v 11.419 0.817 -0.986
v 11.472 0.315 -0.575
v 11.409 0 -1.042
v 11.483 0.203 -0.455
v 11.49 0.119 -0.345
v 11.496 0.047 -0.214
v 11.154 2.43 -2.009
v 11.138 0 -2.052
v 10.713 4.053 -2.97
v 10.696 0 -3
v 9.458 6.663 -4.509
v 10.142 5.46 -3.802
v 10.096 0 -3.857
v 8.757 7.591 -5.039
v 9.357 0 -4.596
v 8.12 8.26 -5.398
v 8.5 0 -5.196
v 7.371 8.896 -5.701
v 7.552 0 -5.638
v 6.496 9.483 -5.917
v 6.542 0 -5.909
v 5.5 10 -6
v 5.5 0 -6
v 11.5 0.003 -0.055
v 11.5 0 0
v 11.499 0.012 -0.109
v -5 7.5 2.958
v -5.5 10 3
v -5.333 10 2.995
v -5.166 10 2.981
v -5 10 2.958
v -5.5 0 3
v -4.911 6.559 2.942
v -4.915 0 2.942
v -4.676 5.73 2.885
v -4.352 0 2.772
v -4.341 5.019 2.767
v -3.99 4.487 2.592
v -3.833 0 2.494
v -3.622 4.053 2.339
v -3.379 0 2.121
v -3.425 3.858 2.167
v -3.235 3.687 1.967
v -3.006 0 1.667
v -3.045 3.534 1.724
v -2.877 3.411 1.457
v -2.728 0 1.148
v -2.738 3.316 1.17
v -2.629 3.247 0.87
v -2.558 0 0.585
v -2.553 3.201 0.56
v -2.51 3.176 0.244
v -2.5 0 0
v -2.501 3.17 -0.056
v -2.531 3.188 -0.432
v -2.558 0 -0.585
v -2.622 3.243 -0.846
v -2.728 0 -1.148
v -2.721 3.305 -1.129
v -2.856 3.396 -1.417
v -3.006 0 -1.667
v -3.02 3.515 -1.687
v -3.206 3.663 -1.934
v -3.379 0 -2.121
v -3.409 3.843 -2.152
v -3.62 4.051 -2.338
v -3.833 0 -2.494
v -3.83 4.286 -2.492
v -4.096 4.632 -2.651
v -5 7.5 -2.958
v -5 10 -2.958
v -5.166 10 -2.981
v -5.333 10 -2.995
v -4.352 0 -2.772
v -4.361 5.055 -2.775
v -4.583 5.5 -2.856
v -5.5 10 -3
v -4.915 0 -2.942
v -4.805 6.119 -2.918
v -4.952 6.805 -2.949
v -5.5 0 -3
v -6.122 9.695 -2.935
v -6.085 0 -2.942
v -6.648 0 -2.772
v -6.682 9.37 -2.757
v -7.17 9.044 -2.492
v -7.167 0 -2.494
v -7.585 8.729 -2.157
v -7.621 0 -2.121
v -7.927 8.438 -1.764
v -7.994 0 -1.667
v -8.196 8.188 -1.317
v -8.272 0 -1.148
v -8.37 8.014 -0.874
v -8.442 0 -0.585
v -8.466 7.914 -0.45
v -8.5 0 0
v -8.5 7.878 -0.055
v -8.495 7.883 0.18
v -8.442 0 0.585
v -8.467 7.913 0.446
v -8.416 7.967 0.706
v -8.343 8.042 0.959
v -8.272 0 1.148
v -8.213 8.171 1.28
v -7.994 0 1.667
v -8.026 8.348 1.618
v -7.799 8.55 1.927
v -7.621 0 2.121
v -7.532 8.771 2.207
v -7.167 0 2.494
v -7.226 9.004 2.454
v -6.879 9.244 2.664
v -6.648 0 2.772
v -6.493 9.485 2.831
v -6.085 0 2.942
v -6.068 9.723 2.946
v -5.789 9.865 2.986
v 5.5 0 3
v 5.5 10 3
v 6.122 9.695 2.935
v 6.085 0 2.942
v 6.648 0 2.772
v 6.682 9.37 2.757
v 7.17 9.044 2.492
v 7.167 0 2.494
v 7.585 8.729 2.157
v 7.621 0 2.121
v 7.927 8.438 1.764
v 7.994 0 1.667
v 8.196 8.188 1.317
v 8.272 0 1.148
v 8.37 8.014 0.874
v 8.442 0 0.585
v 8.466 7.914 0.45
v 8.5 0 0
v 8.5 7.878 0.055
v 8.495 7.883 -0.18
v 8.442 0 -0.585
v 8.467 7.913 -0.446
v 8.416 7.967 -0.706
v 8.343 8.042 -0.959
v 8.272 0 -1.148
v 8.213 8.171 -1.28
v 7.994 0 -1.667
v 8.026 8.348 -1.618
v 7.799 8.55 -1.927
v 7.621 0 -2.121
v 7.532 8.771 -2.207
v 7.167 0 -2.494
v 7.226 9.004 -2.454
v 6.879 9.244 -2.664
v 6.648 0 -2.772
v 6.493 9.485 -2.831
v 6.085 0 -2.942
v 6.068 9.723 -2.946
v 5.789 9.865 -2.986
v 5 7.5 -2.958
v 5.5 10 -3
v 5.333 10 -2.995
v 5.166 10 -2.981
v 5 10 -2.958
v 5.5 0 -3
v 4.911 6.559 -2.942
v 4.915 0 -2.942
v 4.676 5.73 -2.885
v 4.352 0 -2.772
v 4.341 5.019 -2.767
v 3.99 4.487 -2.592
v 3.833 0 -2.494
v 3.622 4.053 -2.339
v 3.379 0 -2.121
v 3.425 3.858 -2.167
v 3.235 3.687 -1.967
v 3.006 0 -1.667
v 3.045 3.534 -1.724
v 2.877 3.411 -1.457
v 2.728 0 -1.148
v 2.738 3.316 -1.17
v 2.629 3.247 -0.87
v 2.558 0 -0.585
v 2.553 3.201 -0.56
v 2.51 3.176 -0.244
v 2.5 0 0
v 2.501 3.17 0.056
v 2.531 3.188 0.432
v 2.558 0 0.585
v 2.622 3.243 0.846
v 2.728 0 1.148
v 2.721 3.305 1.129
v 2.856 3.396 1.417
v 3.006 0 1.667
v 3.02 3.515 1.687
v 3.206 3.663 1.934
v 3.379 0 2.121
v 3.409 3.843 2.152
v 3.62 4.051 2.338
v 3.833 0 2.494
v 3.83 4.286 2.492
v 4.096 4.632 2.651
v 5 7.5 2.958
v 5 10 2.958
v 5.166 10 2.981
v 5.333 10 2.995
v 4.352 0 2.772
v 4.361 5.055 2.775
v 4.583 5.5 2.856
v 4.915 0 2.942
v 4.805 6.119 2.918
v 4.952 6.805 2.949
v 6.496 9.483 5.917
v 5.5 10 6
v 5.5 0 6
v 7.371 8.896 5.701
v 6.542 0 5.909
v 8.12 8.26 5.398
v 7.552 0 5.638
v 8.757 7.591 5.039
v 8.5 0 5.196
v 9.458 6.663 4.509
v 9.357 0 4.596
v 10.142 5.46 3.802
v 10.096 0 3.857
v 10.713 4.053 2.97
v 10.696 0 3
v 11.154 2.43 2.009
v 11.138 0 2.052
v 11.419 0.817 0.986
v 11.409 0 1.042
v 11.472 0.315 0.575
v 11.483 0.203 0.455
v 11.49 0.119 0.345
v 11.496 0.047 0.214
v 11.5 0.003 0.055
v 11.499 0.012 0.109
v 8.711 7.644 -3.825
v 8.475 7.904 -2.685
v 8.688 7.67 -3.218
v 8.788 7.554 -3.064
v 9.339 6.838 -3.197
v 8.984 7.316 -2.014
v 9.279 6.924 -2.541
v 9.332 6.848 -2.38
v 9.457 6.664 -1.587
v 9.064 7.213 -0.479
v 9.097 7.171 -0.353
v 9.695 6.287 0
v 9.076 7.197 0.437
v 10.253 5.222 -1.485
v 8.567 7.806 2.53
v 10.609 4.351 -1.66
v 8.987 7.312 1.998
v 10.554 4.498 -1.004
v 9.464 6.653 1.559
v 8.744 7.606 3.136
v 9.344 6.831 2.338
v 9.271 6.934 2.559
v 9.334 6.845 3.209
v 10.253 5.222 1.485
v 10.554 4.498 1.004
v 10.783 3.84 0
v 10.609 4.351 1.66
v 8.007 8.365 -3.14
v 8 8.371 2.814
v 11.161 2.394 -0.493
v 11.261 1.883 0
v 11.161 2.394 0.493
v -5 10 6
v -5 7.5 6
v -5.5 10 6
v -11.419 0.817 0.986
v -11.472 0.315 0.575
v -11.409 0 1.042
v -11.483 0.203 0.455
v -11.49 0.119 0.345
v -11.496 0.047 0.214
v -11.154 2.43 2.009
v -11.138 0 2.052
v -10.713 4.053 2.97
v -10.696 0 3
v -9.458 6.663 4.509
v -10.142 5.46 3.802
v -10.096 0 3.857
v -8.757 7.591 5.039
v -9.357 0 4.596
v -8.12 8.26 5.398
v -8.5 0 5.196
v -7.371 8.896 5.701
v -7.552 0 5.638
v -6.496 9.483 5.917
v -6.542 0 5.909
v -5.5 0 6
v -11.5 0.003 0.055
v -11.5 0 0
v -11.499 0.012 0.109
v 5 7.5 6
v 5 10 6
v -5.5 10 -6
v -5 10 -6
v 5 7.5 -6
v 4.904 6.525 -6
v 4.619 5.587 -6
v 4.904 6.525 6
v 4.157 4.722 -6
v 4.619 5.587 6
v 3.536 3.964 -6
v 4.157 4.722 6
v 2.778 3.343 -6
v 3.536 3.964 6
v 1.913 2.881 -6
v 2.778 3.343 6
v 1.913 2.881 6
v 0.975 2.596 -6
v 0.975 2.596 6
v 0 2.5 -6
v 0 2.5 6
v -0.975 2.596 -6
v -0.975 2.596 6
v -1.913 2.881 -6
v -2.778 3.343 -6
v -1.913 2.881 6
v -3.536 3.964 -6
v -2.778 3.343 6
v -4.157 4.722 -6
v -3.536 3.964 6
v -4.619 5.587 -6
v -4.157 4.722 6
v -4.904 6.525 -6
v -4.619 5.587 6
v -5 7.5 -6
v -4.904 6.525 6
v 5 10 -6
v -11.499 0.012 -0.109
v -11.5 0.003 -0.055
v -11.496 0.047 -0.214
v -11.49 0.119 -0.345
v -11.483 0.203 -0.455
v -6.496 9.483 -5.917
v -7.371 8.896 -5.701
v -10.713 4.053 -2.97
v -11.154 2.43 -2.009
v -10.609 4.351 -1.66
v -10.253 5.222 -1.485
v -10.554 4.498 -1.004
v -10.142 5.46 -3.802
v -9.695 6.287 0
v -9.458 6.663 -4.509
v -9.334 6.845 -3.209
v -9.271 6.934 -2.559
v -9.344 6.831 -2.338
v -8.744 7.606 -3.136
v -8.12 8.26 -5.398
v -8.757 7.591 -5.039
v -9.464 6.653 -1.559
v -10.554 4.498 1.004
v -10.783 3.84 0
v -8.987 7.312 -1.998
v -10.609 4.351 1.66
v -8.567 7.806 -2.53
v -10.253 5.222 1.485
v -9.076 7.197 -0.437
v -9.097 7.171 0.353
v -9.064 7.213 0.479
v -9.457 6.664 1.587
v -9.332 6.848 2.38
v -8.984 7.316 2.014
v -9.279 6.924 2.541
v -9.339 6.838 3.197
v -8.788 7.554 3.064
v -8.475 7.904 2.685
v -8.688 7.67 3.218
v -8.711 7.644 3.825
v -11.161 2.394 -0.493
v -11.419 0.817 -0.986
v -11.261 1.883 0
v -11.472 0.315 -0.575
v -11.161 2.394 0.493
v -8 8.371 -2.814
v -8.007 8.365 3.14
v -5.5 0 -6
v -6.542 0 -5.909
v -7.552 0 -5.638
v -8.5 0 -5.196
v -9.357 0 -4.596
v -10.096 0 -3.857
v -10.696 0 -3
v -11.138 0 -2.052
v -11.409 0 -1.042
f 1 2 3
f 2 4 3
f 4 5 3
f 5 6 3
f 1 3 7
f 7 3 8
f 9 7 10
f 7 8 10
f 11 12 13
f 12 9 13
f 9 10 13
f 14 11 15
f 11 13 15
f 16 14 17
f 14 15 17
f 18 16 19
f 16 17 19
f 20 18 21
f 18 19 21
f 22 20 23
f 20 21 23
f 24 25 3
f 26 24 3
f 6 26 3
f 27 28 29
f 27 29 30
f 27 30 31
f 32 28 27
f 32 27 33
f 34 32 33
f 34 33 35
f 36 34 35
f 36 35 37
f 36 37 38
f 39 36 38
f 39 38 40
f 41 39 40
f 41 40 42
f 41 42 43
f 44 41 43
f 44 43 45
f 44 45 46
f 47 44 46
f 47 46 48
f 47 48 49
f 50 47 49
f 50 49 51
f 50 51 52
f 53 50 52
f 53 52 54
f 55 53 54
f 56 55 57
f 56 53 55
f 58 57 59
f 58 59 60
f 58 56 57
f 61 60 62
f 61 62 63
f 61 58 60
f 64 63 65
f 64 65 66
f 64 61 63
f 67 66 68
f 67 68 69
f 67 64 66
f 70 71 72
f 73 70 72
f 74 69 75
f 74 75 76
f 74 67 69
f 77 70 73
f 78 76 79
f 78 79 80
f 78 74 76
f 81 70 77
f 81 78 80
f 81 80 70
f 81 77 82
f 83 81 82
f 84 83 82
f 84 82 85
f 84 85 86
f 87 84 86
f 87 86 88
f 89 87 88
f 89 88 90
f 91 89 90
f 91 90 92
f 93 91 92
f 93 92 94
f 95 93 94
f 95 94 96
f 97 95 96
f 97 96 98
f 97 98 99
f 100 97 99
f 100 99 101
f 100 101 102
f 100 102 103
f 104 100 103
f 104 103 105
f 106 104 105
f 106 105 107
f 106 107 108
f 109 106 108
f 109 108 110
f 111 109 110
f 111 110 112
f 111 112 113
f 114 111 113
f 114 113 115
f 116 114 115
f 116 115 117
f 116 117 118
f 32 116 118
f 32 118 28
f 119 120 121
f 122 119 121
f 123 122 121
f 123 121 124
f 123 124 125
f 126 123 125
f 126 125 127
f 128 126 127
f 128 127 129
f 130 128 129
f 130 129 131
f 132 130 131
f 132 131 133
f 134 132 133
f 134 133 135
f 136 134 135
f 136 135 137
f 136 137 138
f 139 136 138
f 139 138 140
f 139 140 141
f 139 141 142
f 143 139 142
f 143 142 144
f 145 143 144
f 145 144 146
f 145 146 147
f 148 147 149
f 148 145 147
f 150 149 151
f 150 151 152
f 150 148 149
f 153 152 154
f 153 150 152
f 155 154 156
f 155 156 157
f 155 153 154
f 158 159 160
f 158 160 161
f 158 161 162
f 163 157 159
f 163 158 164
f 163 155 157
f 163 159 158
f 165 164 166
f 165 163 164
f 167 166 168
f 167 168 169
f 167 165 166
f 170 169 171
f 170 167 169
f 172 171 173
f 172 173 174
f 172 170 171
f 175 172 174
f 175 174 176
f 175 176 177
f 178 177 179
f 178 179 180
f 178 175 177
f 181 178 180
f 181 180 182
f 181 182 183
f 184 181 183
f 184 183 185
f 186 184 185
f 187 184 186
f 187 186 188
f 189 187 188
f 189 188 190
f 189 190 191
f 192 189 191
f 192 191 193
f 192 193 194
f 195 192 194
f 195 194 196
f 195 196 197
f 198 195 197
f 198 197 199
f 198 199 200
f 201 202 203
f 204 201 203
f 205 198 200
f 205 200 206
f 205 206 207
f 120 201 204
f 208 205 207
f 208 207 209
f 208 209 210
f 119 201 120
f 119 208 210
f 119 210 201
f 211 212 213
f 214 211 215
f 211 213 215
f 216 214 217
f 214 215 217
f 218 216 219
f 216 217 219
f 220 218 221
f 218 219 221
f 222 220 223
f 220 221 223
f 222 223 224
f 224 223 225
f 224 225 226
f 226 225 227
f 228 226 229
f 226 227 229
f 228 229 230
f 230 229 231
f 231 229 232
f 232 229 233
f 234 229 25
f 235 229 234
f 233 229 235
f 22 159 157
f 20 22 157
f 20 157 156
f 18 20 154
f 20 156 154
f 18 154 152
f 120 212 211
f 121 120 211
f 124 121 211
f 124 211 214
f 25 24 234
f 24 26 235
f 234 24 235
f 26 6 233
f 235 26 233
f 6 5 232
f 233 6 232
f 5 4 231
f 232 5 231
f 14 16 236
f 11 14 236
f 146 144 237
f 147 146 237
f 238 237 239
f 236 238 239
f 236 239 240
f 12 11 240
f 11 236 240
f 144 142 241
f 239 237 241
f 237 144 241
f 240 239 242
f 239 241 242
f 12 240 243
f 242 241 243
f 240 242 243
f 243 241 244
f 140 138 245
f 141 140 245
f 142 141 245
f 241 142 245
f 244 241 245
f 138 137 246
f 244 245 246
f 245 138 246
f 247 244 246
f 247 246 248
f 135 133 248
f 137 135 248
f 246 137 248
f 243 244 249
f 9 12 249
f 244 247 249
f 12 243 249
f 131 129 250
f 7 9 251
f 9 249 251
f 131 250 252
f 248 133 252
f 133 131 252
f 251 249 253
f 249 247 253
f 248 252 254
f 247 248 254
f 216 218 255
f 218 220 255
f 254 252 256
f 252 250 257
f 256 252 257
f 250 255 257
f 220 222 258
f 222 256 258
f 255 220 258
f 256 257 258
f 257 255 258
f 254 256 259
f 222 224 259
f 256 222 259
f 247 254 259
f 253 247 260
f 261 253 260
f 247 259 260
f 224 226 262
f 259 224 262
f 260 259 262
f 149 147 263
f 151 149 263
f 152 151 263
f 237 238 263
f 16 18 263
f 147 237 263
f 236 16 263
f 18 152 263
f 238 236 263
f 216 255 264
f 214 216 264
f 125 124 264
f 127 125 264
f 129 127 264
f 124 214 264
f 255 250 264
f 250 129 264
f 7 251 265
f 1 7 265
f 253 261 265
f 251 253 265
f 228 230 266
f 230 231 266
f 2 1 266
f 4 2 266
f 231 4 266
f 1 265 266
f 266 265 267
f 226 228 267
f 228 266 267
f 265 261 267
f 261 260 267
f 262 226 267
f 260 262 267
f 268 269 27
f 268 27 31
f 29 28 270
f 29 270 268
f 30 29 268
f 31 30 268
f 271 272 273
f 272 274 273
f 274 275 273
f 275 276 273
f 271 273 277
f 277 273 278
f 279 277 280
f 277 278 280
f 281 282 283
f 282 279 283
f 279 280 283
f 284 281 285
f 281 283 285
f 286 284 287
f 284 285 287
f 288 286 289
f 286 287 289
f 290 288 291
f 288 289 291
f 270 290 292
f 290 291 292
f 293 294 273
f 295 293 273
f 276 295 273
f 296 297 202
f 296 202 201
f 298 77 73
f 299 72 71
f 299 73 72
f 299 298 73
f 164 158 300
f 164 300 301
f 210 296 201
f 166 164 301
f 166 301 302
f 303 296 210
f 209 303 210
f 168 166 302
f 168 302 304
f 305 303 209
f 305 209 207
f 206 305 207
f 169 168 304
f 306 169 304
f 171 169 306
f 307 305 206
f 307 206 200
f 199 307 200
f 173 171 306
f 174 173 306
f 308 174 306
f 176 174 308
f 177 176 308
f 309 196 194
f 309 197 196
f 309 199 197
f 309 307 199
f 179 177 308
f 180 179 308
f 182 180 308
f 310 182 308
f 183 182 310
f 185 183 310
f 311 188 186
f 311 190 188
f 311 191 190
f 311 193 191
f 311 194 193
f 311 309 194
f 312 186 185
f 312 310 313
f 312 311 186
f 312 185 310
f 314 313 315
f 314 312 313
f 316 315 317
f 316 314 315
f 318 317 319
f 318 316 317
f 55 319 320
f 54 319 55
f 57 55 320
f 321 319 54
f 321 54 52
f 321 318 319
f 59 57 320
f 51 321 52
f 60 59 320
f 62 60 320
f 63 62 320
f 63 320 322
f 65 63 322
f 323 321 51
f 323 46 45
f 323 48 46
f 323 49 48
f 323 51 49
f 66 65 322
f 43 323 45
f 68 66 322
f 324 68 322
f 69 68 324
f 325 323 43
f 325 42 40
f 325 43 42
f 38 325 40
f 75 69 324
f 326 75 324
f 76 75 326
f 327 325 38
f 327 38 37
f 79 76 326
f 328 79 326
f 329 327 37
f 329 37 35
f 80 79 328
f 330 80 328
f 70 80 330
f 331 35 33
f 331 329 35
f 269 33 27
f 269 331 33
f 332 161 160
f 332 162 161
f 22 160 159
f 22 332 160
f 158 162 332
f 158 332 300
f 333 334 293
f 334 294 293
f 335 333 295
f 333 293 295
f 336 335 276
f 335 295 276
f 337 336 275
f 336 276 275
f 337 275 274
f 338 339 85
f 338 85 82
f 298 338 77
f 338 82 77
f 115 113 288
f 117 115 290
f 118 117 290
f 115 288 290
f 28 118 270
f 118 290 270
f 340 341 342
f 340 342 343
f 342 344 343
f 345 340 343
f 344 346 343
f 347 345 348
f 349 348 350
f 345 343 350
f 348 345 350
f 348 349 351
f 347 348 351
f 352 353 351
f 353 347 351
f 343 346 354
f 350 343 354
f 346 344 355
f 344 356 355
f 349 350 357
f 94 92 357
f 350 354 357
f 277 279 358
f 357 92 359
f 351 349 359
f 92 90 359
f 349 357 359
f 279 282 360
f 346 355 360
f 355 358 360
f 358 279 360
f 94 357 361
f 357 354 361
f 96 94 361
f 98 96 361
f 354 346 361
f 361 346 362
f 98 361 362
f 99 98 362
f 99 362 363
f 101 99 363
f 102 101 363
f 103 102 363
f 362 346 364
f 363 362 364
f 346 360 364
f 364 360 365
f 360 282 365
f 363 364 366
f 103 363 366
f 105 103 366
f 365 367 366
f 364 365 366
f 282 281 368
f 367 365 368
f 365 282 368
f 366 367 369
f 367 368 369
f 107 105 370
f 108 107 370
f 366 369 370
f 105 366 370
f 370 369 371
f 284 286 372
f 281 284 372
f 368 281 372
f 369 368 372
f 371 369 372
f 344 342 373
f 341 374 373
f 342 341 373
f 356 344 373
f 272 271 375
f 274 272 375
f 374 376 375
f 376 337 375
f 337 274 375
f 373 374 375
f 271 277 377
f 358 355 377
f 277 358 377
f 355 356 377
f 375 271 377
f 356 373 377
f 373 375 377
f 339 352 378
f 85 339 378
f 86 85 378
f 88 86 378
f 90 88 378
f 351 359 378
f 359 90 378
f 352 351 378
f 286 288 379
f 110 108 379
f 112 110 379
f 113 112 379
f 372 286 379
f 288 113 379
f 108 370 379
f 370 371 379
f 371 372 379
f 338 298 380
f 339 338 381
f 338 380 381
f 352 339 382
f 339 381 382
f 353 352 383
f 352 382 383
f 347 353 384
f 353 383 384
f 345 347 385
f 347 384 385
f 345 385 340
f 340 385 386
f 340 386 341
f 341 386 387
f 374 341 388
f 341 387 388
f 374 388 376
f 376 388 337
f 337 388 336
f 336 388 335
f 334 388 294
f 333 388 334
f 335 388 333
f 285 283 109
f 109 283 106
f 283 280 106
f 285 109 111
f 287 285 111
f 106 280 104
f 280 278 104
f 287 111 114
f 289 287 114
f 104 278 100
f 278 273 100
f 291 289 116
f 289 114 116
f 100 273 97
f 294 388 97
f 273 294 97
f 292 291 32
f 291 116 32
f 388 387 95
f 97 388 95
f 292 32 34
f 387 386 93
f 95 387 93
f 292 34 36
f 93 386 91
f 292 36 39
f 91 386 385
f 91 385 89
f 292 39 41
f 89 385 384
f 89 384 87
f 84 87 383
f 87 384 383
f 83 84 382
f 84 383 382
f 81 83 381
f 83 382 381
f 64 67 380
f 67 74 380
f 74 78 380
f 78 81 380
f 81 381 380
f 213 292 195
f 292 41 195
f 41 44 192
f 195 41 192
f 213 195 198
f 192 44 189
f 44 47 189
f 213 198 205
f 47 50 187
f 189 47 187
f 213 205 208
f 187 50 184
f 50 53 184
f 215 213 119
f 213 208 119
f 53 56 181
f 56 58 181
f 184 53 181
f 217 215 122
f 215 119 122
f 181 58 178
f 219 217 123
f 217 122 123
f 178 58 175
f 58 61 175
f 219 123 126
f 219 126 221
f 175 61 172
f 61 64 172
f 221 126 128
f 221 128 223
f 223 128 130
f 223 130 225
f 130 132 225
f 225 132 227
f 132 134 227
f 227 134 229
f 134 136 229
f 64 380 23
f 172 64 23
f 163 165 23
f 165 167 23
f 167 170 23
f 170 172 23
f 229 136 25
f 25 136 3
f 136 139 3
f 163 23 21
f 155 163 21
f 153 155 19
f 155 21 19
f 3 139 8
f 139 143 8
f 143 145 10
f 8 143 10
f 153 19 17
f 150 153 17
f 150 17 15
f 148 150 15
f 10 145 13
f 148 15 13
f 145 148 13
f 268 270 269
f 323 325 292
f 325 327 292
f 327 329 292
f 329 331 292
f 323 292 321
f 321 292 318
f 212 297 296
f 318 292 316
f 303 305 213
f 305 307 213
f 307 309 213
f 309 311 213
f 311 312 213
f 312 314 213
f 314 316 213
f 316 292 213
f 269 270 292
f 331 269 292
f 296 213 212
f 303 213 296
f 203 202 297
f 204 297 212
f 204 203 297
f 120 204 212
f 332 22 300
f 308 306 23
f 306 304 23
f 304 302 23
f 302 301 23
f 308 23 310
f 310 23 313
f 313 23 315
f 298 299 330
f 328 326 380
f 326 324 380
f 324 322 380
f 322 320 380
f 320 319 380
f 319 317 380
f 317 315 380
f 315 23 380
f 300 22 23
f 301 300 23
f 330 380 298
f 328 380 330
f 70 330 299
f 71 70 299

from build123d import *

# Parameters (mm, degrees)
ESBO_O1_R                = 3
RESSALTO_EXTRUS_O1_DEPTH = 10
CORTE_EXTRUS_O1_DEPTH    = 20.397164741
CORTE_EXTRUS_O2_DEPTH    = 20.397164855


with BuildPart() as part:
    # Esboço1 → Ressalto-extrusão1 (new body)
    with BuildSketch(Plane(origin=(0, 0, 0), x_dir=(1, 0, 0), z_dir=(0, 1, 0))):
        with BuildLine():
            Line((-5.5, -6), (5.5, -6))
            ThreePointArc((5.5, -6), (11.5, 0), (5.5, 6))
            Line((5.5, 6), (-5.5, 6))
            ThreePointArc((-5.5, 6), (-11.5, 0), (-5.5, -6))
        make_face()
        with Locations(Location((-5.5, 0, 0), (0, 0, 270))):
            Circle(ESBO_O1_R, mode=Mode.SUBTRACT)
        with Locations(Location((5.5, 0, 0), (0, 0, 270))):
            Circle(ESBO_O1_R, mode=Mode.SUBTRACT)
    extrude(amount=RESSALTO_EXTRUS_O1_DEPTH)

    # Esboço2 → Corte-extrusão1 (cut, through all)
    with BuildSketch(Plane.XY.offset(6)):
        with BuildLine():
            Line((-5, 7.5), (-5, 10))
            Line((-5, 10), (5, 10))
            Line((5, 10), (5, 7.5))
            ThreePointArc((5, 7.5), (0, 2.5), (-5, 7.5))
        make_face()
    extrude(amount=-CORTE_EXTRUS_O1_DEPTH, mode=Mode.SUBTRACT)

    # Esboço3 → Corte-extrusão2 (cut, through all)
    with BuildSketch(Plane.XY.offset(6)):
        with BuildLine():
            Line((-11.5, 10), (-11.5, 0))
            add(Edge.make_bspline(
                [(-11.5, 0), (-10.890573495, 7.573019438), (-5.5, 10)],
                knots=[0, 0, 0, 0.339761367, 0.339761367, 0.339761367], degree=2))
            Line((-5.5, 10), (-11.5, 10))
        make_face()
        with BuildLine():
            Line((11.5, 10), (5.5, 10))
            add(Edge.make_bspline(
                [(5.5, 10), (10.890573495, 7.573019438), (11.5, 0)],
                knots=[0.660238633, 0.660238633, 0.660238633, 1, 1, 1], degree=2))
            Line((11.5, 0), (11.5, 10))
        make_face()
    extrude(amount=-CORTE_EXTRUS_O2_DEPTH, mode=Mode.SUBTRACT)


solid = part.part
